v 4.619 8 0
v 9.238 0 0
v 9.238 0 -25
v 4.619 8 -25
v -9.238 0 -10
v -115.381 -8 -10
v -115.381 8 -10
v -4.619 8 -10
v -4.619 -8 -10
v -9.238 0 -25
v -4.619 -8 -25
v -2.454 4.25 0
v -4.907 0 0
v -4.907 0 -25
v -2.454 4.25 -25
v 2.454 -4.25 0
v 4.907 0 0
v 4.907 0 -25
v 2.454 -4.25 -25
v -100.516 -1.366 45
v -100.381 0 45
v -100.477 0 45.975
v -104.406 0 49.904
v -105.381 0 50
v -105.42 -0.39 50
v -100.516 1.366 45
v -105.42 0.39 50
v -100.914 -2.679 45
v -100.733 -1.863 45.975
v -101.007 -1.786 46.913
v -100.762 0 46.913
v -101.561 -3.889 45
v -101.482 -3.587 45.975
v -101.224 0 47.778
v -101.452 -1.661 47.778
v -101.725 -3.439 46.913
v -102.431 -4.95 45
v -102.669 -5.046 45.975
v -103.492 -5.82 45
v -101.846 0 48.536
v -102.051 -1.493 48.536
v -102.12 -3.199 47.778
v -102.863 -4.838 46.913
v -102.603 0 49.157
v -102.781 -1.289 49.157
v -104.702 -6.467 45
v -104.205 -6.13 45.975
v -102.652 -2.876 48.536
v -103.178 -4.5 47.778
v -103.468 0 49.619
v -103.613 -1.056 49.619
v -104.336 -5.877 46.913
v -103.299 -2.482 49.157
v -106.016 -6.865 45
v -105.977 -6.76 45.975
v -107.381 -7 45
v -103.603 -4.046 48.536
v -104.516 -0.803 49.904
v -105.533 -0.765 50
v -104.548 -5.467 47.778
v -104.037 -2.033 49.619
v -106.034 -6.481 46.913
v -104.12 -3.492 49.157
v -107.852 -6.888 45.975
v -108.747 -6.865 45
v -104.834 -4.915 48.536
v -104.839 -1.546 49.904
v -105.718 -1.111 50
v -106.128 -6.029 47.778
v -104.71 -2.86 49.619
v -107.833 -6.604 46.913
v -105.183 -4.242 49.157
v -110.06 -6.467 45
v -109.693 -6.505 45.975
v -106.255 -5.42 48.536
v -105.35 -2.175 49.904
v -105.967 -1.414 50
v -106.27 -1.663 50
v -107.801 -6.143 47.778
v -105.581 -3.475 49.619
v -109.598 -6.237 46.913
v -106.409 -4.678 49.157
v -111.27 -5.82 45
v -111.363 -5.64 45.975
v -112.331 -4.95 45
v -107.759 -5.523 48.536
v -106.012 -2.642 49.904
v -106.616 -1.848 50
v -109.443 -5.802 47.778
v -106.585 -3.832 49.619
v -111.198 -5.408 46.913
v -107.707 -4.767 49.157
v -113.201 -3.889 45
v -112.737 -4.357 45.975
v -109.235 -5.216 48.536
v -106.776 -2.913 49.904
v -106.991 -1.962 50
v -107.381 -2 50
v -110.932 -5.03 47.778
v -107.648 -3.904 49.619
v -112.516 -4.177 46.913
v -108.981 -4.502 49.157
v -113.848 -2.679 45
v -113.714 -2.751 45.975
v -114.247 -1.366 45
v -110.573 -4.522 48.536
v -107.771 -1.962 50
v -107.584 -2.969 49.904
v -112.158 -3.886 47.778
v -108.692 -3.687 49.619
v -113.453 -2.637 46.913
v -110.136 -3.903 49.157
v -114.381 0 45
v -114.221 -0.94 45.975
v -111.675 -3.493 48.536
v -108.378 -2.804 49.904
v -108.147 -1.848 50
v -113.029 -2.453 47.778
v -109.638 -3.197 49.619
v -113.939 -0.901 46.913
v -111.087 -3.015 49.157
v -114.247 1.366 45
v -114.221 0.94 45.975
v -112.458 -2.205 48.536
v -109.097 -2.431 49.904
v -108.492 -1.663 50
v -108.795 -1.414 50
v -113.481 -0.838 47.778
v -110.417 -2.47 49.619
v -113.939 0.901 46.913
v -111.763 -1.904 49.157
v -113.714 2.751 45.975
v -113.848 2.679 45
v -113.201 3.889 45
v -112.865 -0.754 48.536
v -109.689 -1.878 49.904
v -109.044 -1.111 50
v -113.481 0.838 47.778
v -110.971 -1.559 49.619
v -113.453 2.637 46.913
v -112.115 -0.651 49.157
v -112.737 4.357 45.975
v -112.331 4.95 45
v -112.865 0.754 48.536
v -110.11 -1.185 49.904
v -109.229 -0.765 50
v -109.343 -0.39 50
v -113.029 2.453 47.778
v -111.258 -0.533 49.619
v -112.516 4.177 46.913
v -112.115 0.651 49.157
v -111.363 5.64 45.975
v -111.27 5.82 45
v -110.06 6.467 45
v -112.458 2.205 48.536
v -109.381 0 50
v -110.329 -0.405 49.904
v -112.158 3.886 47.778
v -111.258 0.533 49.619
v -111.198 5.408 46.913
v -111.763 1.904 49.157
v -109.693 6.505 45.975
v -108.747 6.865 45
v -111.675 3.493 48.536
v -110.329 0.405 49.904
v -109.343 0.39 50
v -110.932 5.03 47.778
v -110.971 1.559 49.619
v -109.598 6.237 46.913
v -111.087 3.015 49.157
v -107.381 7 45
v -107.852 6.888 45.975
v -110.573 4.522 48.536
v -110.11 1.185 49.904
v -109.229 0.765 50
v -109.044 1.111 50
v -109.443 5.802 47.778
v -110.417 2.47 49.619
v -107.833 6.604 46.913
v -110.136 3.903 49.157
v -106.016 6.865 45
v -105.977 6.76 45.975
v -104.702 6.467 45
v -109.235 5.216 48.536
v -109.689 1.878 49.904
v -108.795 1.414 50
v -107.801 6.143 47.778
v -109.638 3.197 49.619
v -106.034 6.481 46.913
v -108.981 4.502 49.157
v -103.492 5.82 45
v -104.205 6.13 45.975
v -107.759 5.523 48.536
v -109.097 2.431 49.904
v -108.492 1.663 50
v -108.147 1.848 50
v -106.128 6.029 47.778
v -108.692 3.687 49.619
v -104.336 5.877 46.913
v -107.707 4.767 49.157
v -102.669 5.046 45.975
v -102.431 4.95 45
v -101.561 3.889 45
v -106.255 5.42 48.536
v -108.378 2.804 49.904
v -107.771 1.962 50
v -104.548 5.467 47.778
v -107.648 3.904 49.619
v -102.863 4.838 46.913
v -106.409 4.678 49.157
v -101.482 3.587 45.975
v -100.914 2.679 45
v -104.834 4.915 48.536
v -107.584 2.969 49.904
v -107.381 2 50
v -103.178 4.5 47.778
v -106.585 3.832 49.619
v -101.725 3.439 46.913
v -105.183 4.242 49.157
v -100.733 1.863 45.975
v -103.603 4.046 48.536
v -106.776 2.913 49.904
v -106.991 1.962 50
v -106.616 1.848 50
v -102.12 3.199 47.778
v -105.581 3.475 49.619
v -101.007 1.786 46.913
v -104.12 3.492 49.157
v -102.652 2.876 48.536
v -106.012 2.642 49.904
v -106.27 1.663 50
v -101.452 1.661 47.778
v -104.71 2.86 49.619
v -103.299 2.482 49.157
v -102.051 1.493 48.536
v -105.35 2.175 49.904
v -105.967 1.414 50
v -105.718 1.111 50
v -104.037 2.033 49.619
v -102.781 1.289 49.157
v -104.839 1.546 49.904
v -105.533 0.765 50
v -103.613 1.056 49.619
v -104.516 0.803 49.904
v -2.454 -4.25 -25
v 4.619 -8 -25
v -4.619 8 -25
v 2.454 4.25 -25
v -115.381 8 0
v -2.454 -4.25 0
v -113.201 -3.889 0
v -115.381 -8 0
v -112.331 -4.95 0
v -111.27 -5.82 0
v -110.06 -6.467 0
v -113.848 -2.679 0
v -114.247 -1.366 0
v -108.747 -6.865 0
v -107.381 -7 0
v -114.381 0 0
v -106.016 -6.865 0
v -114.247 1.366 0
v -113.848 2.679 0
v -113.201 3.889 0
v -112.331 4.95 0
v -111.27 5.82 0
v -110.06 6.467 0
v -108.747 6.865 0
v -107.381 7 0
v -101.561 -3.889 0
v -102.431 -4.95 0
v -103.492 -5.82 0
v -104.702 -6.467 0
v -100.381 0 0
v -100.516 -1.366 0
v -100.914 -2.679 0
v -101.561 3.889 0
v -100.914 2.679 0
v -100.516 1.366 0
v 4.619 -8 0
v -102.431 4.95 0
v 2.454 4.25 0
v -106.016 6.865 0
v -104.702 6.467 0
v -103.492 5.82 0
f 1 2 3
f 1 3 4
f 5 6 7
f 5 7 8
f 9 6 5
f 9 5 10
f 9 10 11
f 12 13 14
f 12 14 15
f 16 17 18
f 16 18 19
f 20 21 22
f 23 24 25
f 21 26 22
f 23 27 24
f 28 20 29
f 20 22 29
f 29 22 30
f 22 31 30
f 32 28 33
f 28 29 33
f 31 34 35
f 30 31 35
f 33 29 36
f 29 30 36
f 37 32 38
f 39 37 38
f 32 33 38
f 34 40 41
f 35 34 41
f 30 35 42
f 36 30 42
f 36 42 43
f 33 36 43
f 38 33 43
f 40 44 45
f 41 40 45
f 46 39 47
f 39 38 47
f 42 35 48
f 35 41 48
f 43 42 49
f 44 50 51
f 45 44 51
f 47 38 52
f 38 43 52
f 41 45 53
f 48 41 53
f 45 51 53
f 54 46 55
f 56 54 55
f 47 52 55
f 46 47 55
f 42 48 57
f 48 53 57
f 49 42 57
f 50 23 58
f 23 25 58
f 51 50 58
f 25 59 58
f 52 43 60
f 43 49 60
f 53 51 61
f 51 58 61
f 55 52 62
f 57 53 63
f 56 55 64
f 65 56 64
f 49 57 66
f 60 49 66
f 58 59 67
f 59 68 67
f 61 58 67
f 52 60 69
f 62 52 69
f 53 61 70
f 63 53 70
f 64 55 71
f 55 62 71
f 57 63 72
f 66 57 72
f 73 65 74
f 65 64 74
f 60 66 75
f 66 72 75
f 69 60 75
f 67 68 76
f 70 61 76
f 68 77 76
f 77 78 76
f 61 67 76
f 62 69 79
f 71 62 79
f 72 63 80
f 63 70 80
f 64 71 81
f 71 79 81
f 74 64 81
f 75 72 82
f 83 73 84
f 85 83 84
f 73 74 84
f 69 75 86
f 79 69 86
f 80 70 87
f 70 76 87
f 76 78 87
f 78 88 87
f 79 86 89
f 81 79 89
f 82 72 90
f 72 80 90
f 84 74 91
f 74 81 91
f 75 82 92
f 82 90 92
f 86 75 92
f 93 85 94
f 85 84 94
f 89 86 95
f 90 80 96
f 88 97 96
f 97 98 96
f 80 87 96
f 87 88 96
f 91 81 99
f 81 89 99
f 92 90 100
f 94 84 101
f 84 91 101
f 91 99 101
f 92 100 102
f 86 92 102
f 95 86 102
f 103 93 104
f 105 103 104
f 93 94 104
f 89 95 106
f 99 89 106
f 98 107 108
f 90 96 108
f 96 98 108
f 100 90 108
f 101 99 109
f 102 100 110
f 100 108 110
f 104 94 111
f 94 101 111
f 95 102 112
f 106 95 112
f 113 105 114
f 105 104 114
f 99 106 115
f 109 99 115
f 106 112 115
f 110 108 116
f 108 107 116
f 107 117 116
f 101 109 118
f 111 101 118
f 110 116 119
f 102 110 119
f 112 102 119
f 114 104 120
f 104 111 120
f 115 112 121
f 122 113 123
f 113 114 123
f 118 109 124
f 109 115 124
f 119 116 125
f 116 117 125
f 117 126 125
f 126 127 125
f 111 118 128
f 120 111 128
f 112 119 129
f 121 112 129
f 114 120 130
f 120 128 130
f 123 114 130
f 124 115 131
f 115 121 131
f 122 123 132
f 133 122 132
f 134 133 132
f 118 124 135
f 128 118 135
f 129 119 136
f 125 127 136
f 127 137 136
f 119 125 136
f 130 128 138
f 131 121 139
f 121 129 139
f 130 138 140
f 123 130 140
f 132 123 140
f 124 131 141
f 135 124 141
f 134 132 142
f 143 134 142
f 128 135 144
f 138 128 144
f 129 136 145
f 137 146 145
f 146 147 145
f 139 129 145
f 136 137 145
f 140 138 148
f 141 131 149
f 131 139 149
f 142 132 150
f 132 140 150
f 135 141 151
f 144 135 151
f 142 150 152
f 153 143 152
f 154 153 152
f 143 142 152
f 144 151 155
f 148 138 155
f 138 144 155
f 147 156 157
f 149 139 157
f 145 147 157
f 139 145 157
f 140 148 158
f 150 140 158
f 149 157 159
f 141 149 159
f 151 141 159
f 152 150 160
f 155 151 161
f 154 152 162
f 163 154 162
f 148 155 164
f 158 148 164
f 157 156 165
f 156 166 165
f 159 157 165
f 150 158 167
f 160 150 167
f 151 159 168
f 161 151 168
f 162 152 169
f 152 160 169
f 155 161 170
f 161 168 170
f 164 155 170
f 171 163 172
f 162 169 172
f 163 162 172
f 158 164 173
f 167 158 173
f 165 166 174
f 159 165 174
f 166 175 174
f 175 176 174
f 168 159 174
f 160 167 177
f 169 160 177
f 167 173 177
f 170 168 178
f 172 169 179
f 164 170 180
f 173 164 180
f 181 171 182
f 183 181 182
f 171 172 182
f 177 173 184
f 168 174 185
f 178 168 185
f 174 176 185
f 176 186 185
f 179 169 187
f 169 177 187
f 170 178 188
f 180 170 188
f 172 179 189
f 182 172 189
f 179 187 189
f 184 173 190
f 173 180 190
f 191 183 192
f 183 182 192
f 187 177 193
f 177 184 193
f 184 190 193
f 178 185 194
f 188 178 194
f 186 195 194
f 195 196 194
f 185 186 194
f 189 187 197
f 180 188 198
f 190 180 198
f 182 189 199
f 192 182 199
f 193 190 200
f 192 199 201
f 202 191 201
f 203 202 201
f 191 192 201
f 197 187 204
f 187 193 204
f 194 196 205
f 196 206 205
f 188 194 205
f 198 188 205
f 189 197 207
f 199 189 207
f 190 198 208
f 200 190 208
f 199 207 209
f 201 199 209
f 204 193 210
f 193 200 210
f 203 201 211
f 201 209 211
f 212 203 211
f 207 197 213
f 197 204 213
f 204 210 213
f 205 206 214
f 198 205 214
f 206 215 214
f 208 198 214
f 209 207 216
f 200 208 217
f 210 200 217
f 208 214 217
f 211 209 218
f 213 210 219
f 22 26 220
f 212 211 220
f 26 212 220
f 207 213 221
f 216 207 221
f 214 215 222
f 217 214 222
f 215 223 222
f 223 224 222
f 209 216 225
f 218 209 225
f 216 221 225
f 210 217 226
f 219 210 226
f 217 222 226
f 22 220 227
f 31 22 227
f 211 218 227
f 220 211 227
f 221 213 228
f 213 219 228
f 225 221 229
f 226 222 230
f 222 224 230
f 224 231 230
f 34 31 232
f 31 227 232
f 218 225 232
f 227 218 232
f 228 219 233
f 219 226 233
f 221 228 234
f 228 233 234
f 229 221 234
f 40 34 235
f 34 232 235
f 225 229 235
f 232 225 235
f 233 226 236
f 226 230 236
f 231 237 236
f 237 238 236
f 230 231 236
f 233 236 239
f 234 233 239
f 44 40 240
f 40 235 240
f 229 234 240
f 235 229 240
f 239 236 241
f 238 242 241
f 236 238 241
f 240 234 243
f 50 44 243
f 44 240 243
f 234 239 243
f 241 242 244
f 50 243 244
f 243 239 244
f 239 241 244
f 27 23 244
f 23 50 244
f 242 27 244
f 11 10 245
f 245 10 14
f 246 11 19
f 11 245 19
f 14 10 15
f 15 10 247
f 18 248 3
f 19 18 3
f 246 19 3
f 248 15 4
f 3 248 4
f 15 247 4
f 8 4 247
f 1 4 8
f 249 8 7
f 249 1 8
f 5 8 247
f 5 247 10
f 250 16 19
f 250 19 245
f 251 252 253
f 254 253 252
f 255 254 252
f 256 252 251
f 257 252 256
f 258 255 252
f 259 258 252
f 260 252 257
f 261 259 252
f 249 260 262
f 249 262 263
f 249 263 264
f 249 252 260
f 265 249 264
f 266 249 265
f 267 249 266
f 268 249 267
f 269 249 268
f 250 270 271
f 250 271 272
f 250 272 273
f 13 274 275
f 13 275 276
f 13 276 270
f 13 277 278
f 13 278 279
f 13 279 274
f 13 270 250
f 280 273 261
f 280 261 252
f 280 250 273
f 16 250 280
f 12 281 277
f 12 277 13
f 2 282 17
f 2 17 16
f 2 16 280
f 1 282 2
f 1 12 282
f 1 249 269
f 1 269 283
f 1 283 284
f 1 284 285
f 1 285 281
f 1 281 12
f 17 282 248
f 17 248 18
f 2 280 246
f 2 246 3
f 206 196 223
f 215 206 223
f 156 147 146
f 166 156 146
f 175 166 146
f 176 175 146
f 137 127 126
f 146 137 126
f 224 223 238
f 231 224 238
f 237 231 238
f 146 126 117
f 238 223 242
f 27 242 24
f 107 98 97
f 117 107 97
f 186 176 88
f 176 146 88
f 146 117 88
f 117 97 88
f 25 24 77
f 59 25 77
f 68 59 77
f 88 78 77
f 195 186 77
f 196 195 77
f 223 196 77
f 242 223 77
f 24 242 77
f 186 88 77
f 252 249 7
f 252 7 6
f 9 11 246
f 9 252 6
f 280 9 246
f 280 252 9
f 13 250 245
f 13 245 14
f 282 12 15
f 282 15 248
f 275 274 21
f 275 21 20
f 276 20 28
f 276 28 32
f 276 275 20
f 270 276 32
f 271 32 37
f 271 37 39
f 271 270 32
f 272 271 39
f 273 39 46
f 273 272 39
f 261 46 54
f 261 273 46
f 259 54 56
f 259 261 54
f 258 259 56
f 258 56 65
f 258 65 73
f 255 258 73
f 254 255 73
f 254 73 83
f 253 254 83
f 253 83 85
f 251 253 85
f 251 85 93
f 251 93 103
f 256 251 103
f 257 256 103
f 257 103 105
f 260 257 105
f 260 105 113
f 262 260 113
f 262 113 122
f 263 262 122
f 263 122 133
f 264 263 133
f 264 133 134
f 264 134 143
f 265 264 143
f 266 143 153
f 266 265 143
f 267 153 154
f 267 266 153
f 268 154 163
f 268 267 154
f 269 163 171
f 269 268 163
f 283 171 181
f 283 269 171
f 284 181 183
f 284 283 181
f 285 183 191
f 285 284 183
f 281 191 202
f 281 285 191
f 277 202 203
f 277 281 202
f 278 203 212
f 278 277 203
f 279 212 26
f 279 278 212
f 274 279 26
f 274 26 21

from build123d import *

# Parameters (mm, degrees)
F1_DEPTH = 10
F2_DEPTH = 25
F3_R     = 7
F4_DEPTH = 60
F5_R     = 5


with BuildPart() as f1:
    # F0 (on Top) → F1 (new body)
    with BuildSketch(Plane.XY):
        Polygon((-115.381198, -8), (-4.618802, -8), (-9.237604, 0), (-4.618802, 8), (-115.381198, 8), align=None)
    extrude(amount=-F1_DEPTH)

    # F0 (on Top) → F2 (join)
    with BuildSketch(Plane.XY):
        Polygon((4.618802, -8), (9.237604, 0), (4.618802, 8), (-4.618802, 8), (-9.237604, 0), (-4.618802, -8), align=None)
        Polygon((2.453739, 4.25), (4.907477, 0), (2.453739, -4.25), (-2.453739, -4.25), (-4.907477, 0), (-2.453739, 4.25), align=None, mode=Mode.SUBTRACT)
    extrude(amount=-F2_DEPTH)

    # F3 (on face) → F4 (join)
    with BuildSketch(Plane(origin=(0, 0, -10), x_dir=(1, 0, 0), z_dir=(0, 0, -1))):
        with Locations((-107.381198, 0)):
            Circle(F3_R)
    extrude(amount=-F4_DEPTH)

    # F5
    f5_edges = [f1.edges().sort_by_distance(p)[0] for p in [
        (-114.381198, 0, 50),
    ]]
    fillet(f5_edges, radius=F5_R)


solid = f1.part
